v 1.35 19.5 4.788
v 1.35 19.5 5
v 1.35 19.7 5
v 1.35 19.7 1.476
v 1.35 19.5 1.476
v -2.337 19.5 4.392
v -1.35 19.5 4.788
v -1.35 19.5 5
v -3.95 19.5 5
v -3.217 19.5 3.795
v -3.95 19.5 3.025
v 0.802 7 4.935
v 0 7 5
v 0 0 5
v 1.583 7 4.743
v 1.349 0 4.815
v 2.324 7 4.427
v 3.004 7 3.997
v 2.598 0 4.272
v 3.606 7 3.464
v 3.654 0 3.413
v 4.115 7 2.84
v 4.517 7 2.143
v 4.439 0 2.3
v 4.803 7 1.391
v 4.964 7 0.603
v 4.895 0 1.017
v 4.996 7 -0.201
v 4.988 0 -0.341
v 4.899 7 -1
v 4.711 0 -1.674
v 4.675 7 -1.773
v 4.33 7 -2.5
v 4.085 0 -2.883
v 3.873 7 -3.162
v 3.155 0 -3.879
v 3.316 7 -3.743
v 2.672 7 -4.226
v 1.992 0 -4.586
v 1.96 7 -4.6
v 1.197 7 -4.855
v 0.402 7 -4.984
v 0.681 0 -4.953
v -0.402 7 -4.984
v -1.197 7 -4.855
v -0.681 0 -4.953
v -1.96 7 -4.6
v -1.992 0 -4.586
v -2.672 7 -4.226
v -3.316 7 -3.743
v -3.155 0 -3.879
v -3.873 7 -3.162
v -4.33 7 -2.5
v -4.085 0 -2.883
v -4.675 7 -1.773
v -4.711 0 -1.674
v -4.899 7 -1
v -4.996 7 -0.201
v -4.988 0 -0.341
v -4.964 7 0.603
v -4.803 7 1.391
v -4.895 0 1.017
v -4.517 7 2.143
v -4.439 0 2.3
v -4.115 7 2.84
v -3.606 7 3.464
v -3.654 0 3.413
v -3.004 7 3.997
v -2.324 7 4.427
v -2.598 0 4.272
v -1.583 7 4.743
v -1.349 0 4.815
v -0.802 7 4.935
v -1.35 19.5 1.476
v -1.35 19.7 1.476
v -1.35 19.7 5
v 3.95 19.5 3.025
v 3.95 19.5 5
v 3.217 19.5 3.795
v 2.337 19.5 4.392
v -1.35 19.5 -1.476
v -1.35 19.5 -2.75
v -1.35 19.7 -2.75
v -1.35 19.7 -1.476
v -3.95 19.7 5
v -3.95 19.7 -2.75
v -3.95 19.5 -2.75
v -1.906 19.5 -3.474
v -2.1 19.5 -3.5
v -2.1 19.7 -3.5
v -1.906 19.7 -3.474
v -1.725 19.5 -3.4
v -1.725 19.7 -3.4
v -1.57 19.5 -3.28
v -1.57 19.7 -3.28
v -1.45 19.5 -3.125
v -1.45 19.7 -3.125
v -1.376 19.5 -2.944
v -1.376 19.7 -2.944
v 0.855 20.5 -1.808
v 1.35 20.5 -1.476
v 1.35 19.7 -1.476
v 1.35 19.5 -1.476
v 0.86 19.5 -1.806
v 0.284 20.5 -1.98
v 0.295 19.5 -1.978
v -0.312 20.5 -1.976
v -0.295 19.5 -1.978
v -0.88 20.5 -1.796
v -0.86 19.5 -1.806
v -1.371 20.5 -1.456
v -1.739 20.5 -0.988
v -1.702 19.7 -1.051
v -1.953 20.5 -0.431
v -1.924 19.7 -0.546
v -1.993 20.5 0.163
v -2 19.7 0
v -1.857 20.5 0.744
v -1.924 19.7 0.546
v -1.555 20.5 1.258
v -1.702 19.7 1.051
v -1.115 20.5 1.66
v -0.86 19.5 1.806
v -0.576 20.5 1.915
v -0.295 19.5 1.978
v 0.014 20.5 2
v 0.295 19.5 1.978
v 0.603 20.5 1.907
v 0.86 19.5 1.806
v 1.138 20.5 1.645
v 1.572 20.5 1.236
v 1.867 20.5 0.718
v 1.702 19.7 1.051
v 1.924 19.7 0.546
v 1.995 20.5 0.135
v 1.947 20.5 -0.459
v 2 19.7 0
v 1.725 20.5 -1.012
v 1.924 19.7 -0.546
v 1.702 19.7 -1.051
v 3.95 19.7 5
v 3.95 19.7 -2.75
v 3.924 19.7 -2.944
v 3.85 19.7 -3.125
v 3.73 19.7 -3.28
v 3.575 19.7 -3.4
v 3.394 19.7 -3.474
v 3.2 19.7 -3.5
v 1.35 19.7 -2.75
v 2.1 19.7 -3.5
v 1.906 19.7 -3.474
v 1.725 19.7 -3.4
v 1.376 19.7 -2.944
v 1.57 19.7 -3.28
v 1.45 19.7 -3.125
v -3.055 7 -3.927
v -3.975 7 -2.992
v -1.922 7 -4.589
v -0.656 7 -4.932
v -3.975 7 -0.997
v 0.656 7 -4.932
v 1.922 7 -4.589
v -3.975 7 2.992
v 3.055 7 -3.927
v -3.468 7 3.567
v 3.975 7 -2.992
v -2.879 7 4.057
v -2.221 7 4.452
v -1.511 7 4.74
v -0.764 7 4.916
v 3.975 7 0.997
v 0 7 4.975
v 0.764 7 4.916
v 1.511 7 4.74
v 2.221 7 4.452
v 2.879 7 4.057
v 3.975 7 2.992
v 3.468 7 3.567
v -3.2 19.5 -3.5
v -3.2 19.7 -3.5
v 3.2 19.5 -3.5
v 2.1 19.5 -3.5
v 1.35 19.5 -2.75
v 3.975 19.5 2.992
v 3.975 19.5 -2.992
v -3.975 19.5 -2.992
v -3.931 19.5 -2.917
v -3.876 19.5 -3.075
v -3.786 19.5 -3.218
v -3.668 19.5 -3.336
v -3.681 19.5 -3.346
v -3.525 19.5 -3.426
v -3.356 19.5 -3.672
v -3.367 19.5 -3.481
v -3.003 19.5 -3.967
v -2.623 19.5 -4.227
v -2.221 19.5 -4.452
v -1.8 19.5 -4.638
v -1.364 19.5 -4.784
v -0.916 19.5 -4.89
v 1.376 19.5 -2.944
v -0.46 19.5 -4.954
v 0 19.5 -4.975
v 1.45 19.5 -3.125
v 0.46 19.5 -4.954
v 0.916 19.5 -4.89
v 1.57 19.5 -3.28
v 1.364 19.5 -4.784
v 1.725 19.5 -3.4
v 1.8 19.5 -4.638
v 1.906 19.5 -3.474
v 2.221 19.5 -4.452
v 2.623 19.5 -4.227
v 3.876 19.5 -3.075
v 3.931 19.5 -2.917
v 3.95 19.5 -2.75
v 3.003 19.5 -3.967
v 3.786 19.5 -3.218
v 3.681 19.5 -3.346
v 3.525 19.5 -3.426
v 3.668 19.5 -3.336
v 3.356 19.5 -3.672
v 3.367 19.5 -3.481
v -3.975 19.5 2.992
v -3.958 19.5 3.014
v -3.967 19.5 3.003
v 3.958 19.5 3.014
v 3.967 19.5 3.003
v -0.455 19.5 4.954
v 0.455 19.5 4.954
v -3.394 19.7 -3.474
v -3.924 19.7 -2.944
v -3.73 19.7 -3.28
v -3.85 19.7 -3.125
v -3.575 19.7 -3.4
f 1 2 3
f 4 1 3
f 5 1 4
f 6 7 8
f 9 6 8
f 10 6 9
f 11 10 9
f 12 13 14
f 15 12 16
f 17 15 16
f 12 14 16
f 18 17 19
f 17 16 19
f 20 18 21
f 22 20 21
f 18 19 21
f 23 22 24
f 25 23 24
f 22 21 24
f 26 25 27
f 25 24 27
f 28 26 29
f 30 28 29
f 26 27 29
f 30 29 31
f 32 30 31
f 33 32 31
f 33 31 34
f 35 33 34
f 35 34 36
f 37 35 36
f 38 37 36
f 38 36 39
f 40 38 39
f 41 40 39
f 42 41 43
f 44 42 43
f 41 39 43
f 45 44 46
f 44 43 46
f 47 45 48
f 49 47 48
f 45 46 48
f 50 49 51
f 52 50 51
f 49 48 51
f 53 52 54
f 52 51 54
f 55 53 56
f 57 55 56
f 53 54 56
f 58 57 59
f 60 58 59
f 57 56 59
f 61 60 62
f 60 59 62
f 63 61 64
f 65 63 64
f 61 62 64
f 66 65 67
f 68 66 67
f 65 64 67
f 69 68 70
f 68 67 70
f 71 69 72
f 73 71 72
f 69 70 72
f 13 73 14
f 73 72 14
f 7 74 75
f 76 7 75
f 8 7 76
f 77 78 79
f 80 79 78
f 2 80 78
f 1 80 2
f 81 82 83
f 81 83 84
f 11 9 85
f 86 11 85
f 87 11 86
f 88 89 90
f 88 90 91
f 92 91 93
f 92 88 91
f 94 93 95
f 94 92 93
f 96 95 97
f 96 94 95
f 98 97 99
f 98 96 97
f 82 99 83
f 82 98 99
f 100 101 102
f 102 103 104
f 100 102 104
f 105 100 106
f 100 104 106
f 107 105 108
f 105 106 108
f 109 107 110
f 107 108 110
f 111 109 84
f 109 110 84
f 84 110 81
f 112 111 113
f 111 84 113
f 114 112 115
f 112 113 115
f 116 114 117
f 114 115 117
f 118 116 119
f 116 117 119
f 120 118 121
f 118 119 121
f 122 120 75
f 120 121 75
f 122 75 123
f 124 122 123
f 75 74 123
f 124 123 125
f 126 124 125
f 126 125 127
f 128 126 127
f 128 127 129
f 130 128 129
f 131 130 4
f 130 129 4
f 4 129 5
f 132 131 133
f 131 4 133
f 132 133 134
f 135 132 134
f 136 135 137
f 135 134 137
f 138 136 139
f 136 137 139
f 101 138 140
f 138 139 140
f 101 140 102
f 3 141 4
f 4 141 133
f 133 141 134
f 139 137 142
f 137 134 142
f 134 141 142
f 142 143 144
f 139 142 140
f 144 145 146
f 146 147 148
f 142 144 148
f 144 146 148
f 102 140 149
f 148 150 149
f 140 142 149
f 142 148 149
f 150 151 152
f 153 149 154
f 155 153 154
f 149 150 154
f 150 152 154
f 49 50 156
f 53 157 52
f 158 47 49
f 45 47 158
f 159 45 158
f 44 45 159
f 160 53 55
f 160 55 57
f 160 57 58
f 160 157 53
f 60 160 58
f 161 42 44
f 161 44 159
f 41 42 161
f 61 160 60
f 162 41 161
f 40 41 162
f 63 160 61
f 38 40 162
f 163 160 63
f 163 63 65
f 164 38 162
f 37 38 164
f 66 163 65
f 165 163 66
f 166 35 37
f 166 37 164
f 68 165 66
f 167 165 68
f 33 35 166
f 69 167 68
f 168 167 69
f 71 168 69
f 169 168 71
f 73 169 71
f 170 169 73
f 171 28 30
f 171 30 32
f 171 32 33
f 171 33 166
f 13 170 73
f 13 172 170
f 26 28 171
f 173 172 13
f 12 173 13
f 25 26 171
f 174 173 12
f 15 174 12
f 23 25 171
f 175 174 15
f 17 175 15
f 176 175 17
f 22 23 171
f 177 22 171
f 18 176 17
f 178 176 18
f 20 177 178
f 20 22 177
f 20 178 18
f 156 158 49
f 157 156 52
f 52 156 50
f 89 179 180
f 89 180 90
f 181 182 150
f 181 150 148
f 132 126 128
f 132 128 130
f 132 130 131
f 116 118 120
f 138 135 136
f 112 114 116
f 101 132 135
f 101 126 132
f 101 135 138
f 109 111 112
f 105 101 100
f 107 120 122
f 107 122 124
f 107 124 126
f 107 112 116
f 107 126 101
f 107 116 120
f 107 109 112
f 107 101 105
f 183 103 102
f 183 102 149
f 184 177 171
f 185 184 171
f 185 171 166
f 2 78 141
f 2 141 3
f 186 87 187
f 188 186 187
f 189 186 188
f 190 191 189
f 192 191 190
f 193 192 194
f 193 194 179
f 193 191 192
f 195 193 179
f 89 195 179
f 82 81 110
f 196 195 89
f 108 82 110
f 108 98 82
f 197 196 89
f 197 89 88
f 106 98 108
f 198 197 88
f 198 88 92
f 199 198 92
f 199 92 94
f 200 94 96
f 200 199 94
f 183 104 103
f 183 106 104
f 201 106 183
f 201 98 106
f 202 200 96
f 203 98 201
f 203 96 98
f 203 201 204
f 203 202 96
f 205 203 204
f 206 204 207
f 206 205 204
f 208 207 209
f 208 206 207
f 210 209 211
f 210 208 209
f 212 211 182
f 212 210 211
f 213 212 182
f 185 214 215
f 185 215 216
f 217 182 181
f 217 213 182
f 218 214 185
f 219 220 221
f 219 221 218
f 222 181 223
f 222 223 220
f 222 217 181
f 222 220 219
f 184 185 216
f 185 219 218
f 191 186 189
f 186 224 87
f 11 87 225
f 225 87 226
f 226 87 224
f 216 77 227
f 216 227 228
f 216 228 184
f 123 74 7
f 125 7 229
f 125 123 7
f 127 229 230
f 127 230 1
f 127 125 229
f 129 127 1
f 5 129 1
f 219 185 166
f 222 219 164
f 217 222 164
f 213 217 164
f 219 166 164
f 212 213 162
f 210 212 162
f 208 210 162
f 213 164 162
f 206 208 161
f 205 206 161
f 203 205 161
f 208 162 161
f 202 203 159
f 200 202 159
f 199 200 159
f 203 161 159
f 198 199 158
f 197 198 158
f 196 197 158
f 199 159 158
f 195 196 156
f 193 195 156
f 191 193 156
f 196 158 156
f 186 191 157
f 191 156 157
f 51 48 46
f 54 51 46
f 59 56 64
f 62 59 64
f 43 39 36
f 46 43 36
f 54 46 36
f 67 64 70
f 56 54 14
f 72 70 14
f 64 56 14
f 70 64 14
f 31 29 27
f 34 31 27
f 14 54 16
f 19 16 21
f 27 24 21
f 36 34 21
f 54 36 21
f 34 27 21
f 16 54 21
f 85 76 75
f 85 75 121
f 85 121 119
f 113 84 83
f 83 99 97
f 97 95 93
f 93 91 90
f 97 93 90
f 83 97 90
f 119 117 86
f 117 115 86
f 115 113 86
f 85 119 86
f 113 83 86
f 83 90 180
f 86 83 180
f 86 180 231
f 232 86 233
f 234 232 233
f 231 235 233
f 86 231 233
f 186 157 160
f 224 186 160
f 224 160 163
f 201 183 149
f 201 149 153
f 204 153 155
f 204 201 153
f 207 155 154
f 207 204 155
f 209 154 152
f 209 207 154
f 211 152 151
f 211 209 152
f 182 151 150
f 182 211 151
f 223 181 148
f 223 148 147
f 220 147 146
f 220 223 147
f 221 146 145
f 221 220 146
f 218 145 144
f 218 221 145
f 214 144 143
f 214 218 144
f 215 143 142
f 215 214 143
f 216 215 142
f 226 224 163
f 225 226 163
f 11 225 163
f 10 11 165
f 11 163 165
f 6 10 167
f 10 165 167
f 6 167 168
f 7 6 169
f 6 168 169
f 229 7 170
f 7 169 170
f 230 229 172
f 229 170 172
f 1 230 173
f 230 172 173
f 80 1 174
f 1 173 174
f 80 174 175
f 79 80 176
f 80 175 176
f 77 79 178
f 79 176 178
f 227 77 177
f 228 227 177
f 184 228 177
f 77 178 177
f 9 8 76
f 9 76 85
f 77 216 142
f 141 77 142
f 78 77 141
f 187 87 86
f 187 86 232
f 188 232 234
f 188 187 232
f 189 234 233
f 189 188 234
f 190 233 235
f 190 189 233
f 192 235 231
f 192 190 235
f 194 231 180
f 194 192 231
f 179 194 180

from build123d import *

# Parameters (mm, degrees)
SKETCH2_R           = 5
BOSS_EXTRUDE1_DEPTH = 7
BOSS_EXTRUDE2_DEPTH = 12.5
BOSS_EXTRUDE3_DEPTH = 0.2
SKETCH5_R           = 2
BOSS_EXTRUDE4_DEPTH = 1


with BuildPart() as part:
    # Sketch2 → Boss-Extrude1 (new body)
    with BuildSketch(Plane(origin=(0, 0, 0), x_dir=(1, 0, 0), z_dir=(0, 1, 0))):
        with Locations(Location((0, 0, 0), (0, 0, 270))):
            Circle(SKETCH2_R)
    extrude(amount=BOSS_EXTRUDE1_DEPTH)

    # Sketch3 → Boss-Extrude2 (add)
    with BuildSketch(Plane(origin=(0, 7, 0), x_dir=(1, 0, 0), z_dir=(0, 1, 0))):
        with BuildLine():
            Line((-3.975, 2.99165506), (-3.975, -2.99165506))
            ThreePointArc((-3.975, -2.99165506), (0, -4.975), (3.975, -2.99165506))
            Line((3.975, -2.99165506), (3.975, 2.99165506))
            ThreePointArc((3.975, 2.99165506), (0, 4.975), (-3.975, 2.99165506))
        make_face()
    extrude(amount=BOSS_EXTRUDE2_DEPTH)

    # Sketch4 → Boss-Extrude3 (add)
    with BuildSketch(Plane(origin=(0, 19.5, 0), x_dir=(1, 0, 0), z_dir=(0, 1, 0))):
        with BuildLine():
            Line((-3.2, 3.5), (-2.1, 3.5))
            ThreePointArc((-2.1, 3.5), (-1.569669914, 3.280330086), (-1.35, 2.75))
            Line((-1.35, 2.75), (-1.35, -5))
            Line((-1.35, -5), (-3.95, -5))
            Line((-3.95, -5), (-3.95, 2.75))
            ThreePointArc((-3.95, 2.75), (-3.730330086, 3.280330086), (-3.2, 3.5))
        make_face()
        with BuildLine():
            Line((3.95, -5), (1.35, -5))
            Line((1.35, -5), (1.35, 2.75))
            ThreePointArc((1.35, 2.75), (1.569669914, 3.280330086), (2.1, 3.5))
            Line((2.1, 3.5), (3.2, 3.5))
            ThreePointArc((3.2, 3.5), (3.730330086, 3.280330086), (3.95, 2.75))
            Line((3.95, 2.75), (3.95, -5))
        make_face()
    extrude(amount=BOSS_EXTRUDE3_DEPTH)

    # Sketch5 → Boss-Extrude4 (add)
    with BuildSketch(Plane(origin=(0, 19.5, 0), x_dir=(1, 0, 0), z_dir=(0, 1, 0))):
        with Locations(Location((0, 0, 0), (0, 0, 47.545849796))):
            Circle(SKETCH5_R)
    extrude(amount=BOSS_EXTRUDE4_DEPTH)


solid = part.part
